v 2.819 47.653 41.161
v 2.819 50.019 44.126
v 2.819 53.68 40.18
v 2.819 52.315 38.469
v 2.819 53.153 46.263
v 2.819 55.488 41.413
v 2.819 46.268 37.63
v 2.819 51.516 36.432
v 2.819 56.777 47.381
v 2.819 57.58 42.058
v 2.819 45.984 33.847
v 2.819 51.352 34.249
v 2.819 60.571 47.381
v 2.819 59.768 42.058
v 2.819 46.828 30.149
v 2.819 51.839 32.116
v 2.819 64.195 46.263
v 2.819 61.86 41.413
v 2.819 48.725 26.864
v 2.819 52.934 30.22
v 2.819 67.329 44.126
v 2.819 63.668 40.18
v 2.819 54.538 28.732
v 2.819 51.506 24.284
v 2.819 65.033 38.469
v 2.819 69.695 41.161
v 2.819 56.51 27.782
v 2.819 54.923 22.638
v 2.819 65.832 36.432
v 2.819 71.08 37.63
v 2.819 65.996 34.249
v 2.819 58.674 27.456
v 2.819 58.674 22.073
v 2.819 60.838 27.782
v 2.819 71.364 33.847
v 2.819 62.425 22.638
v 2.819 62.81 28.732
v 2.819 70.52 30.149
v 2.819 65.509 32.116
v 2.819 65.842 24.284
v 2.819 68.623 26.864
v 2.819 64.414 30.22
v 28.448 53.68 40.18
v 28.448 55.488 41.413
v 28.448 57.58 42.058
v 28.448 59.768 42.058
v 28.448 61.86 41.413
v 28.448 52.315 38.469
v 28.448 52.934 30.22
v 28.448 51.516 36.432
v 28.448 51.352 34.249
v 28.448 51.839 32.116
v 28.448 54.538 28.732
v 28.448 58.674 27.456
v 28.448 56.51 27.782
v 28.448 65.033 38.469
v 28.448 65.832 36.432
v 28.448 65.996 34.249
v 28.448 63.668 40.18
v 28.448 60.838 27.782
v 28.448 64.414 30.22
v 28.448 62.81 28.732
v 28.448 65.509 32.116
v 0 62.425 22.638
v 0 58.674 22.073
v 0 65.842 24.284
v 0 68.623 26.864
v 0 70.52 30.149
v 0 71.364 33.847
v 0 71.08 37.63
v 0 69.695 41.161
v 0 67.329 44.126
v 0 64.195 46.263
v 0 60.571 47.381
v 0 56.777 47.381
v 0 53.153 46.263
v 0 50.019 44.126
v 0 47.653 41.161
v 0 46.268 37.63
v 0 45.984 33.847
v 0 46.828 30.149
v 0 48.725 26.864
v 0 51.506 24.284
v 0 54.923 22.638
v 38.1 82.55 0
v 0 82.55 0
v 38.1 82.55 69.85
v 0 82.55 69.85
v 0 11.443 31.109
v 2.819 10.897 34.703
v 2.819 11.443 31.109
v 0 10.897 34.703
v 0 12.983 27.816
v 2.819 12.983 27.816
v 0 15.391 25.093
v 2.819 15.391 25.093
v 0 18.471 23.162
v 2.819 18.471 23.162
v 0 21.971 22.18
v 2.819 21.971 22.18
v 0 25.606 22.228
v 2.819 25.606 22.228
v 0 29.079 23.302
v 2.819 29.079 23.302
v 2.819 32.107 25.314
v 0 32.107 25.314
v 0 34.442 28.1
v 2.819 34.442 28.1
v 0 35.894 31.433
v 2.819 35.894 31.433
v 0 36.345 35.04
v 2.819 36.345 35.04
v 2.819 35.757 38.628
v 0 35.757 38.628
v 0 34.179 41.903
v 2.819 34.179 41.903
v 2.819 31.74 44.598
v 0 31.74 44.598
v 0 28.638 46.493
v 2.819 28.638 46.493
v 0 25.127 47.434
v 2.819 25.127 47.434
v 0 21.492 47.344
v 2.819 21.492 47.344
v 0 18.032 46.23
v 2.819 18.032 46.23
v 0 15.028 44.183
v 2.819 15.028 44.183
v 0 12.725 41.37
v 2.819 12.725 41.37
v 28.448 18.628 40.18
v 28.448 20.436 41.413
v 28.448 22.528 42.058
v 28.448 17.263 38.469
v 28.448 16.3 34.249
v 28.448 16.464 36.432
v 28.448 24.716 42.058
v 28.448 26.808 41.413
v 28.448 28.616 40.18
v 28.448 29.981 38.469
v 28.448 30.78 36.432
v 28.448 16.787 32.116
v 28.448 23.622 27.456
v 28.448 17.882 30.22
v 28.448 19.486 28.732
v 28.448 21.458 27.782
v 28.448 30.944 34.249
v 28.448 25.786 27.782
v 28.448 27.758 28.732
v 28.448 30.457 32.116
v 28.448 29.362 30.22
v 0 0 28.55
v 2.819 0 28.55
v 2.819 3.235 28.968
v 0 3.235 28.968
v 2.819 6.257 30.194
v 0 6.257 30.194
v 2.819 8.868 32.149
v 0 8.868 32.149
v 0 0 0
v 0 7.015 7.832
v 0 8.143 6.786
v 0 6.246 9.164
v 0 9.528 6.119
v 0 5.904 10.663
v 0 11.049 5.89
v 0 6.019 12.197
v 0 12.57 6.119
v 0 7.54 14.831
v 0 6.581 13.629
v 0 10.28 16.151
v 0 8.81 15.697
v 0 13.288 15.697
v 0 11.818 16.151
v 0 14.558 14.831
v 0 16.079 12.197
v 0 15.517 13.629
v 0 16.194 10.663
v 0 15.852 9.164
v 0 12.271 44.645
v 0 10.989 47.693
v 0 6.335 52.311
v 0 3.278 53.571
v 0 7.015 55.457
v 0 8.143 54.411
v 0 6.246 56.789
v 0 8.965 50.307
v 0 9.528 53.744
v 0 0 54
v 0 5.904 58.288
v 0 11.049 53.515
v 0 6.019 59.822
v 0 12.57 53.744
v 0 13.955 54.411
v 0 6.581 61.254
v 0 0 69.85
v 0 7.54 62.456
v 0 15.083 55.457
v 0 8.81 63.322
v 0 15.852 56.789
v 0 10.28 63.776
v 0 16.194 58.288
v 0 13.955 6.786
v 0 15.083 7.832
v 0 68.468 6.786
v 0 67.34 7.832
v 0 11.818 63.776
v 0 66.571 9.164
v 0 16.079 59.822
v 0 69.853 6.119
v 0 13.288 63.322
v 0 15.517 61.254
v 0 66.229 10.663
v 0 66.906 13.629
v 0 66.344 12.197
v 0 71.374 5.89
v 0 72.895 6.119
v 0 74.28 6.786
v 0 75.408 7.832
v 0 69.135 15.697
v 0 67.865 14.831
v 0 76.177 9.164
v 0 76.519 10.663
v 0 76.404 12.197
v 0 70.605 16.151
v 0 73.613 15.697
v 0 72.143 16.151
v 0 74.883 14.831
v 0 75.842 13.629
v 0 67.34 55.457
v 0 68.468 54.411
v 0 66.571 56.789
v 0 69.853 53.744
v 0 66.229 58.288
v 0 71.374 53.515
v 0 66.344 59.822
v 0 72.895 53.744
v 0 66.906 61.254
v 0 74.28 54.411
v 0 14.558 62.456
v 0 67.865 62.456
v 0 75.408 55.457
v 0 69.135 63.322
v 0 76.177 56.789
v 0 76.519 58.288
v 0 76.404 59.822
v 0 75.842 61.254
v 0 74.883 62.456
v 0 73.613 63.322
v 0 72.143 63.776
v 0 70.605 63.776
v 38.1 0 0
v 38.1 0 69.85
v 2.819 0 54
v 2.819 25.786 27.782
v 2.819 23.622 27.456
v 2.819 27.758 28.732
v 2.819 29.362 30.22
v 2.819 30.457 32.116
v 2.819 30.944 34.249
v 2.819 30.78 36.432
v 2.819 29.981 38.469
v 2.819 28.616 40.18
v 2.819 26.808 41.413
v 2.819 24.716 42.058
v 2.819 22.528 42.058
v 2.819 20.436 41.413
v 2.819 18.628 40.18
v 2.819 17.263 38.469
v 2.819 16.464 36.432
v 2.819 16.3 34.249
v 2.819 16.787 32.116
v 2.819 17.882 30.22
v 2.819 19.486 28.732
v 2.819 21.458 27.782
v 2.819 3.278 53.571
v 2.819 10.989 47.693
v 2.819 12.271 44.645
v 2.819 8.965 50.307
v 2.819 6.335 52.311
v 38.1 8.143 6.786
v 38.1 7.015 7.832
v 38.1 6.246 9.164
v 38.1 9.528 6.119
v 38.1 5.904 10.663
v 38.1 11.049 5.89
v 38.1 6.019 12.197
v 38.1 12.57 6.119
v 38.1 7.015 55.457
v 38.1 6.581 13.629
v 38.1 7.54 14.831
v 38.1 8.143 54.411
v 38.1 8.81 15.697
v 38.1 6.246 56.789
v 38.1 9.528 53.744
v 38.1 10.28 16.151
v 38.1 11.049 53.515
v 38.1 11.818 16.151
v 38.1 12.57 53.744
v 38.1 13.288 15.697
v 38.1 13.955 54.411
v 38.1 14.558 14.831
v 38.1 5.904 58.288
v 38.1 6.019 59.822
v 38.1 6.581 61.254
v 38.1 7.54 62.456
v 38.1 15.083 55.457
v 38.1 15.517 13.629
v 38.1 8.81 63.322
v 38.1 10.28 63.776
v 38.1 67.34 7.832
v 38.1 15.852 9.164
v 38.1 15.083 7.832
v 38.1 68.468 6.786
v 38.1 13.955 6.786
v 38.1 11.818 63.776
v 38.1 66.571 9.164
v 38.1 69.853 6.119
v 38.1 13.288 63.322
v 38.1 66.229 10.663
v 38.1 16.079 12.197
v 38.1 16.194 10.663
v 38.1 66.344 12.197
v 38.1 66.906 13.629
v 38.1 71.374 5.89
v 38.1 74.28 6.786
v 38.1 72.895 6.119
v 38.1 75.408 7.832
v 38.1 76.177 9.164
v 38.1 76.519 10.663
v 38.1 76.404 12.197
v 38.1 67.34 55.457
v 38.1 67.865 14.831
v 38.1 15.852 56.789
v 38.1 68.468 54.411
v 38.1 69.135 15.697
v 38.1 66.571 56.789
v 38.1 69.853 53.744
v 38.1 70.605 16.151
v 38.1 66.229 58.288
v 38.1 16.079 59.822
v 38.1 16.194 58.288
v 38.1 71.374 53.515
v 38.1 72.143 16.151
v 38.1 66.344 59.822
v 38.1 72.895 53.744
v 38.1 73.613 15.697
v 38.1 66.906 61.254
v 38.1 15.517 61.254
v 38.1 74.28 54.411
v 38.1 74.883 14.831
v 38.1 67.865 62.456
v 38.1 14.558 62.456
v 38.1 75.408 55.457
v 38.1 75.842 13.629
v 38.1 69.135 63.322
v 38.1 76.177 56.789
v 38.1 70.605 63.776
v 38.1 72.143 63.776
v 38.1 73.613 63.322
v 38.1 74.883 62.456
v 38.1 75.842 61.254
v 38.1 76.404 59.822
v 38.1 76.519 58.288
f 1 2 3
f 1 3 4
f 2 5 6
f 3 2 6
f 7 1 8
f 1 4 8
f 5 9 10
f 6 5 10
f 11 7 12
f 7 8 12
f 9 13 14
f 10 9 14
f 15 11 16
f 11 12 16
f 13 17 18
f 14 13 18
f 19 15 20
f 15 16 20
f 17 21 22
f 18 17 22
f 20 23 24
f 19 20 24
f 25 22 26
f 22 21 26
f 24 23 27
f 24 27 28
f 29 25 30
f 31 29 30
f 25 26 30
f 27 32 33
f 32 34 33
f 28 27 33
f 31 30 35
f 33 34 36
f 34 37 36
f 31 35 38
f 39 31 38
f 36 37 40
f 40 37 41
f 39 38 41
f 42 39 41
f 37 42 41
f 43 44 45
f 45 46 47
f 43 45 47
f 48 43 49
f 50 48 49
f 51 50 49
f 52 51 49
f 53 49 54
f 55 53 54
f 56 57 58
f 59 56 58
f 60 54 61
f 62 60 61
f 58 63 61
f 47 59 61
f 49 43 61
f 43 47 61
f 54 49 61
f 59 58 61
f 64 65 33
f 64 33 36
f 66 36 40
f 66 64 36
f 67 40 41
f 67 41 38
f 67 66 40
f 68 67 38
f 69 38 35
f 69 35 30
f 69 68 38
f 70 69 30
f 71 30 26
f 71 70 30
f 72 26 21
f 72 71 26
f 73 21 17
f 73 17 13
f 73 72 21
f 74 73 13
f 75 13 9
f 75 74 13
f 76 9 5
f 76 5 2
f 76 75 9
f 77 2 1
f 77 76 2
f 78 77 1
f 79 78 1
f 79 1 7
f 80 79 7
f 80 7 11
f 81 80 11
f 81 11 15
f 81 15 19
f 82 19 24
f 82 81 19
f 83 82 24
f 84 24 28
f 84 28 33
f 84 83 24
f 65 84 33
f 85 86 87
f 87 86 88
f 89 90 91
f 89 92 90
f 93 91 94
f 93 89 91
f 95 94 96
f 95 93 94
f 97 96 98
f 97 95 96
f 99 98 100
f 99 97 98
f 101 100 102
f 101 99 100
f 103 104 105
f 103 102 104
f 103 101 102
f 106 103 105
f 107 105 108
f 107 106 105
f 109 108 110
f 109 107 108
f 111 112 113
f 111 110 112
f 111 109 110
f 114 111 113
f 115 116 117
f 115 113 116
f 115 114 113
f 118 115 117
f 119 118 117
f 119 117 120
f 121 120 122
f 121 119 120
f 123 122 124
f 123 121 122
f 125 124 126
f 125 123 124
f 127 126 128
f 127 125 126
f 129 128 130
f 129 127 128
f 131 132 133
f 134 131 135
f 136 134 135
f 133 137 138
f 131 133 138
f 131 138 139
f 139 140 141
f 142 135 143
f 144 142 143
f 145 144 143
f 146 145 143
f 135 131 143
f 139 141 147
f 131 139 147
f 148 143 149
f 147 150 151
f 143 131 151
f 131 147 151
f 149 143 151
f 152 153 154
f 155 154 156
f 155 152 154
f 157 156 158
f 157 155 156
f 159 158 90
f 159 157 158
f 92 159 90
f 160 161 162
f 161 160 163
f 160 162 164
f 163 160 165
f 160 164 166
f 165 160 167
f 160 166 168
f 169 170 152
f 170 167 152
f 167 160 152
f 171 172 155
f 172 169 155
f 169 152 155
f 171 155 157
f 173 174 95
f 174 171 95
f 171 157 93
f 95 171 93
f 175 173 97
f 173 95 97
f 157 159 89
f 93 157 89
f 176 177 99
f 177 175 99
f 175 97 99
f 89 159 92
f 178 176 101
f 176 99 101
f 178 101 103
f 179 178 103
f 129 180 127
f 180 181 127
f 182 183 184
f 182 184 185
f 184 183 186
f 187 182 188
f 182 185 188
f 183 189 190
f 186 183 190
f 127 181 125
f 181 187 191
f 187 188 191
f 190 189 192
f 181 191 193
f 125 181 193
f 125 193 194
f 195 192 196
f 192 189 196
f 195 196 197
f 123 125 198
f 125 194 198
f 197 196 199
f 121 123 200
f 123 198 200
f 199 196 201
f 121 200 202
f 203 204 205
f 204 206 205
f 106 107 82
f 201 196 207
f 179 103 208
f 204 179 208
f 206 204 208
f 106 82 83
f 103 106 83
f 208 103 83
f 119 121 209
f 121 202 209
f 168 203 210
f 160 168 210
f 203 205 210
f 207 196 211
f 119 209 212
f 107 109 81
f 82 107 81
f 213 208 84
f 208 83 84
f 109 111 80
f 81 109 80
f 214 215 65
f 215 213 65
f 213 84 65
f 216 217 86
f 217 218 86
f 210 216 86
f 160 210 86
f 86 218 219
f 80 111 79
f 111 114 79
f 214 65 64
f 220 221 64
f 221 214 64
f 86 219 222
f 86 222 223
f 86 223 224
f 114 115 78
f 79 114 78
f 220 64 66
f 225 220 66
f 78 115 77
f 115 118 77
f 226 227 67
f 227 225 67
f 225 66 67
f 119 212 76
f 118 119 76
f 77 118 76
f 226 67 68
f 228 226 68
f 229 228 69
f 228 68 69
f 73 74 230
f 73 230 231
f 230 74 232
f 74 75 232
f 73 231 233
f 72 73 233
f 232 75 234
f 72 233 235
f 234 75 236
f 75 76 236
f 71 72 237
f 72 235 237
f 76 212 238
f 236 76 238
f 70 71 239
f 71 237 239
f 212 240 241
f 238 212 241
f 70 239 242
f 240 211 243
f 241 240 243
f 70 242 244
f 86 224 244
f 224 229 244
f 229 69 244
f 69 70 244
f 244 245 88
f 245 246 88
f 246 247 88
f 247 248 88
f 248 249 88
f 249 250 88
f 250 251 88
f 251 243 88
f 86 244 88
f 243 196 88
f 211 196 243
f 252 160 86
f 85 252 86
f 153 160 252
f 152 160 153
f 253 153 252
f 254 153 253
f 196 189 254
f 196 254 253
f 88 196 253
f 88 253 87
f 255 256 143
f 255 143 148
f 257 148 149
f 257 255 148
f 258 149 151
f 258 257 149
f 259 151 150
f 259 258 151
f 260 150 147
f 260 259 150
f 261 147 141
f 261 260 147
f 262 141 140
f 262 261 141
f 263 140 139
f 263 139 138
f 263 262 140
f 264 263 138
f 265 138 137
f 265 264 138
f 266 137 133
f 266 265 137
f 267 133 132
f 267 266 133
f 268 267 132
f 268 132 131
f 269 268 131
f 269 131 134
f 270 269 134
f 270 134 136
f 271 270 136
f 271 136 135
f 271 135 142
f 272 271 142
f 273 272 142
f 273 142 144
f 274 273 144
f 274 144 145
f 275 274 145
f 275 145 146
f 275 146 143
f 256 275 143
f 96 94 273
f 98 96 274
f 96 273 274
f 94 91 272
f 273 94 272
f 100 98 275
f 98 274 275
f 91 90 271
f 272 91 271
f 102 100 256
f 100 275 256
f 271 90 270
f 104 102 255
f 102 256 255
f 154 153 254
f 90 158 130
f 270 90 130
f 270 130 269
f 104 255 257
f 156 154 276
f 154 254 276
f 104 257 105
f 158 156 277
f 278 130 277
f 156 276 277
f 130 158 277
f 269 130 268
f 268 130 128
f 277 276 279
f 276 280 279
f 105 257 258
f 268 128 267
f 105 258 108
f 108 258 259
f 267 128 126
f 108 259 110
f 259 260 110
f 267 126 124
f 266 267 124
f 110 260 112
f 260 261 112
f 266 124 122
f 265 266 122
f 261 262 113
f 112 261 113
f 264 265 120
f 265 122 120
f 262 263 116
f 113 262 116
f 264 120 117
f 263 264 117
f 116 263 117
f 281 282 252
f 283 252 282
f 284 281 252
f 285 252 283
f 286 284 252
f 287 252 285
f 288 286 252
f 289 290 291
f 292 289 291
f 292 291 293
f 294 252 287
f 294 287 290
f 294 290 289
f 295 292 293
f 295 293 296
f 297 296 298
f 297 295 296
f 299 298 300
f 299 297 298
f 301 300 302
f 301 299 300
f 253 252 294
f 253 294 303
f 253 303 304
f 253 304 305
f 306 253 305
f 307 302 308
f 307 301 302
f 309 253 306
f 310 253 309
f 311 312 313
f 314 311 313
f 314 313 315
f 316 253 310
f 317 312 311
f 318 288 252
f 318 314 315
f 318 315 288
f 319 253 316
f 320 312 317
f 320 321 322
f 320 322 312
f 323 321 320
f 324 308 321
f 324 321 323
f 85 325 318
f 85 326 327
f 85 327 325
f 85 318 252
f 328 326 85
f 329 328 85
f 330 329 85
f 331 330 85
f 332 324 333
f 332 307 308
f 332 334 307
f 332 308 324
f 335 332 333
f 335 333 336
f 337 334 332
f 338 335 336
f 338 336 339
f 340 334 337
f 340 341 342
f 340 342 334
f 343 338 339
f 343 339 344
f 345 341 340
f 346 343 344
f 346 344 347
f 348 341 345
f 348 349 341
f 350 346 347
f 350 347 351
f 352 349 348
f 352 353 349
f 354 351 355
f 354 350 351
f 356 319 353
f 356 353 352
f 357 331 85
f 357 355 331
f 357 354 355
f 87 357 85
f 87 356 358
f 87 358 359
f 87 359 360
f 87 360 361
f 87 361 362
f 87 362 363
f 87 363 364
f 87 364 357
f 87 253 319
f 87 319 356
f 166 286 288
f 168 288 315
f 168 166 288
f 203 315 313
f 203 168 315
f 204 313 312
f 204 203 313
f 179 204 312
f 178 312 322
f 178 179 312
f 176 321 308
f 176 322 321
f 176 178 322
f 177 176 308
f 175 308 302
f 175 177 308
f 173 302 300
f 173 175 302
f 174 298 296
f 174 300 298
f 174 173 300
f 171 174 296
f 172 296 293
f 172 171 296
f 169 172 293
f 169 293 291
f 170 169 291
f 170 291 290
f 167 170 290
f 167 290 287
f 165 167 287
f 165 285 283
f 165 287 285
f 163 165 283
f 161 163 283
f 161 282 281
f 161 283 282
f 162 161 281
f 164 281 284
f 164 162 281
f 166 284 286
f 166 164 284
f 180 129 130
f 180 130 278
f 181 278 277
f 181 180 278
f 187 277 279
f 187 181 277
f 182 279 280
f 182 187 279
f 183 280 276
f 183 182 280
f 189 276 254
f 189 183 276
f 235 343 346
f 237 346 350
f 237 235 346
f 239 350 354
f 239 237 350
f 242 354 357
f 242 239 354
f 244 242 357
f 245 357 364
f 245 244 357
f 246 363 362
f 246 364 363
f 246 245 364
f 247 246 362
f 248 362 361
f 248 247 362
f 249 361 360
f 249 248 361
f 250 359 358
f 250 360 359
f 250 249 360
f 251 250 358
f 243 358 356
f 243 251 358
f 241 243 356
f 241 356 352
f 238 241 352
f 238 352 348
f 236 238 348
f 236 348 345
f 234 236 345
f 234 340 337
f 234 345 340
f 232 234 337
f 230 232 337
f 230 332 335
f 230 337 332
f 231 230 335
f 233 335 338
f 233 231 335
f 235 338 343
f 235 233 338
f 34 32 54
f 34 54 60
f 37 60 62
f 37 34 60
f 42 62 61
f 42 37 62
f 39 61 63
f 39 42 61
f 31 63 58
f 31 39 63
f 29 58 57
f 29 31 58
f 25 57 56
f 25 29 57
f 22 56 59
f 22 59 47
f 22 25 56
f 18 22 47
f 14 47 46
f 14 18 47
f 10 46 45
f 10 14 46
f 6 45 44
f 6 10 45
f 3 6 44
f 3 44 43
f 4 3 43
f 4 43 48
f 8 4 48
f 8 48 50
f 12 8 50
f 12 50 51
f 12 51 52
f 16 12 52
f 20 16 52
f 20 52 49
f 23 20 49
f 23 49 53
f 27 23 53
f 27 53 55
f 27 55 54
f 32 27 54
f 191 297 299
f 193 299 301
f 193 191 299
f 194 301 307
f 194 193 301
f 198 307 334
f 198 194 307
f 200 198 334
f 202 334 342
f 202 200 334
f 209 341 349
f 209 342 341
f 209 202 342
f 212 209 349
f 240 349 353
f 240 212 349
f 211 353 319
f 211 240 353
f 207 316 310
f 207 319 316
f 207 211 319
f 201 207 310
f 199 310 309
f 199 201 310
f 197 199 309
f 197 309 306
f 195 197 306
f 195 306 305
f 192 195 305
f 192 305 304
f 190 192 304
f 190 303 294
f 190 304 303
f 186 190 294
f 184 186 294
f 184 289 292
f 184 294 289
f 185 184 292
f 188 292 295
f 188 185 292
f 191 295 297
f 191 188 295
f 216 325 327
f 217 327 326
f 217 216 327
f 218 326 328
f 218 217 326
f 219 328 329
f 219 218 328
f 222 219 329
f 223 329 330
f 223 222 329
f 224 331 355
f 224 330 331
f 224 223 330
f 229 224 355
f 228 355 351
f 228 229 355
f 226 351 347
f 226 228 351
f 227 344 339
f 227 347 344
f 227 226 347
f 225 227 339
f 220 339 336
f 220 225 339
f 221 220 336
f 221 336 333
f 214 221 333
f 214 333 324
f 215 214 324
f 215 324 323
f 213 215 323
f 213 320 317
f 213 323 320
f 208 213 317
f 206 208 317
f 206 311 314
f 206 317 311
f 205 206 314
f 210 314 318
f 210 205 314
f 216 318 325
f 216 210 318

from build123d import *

# Parameters (mm, degrees)
SKETCH1_W           = 82.55
SKETCH1_H           = 69.85
BOSS_EXTRUDE1_DEPTH = 38.1
SKETCH2_R           = 5.159375
CUT_EXTRUDE2_DEPTH  = 115.652235041
SKETCH3_R           = 7.3421875
CUT_EXTRUDE3_DEPTH  = 28.448
SKETCH4_R           = 12.7254
CUT_EXTRUDE4_DEPTH  = 2.8194
SKETCH6_R           = 12.7254
CUT_EXTRUDE7_DEPTH  = 2.8194


with BuildPart() as part:
    # Sketch1 → Boss-Extrude1 (new body)
    with BuildSketch(Plane.YZ):
        with Locations((41.275, 34.925)):
            Rectangle(SKETCH1_W, SKETCH1_H)
    extrude(amount=BOSS_EXTRUDE1_DEPTH)

    # Sketch2 → Cut-Extrude2 (cut, through all)
    with BuildSketch(Plane.YZ):
        with Locations(Location((11.049, 11.049, 0), (0, 0, 270))):
            Circle(SKETCH2_R)
        with Locations(Location((71.374, 11.049, 0), (0, 0, 270))):
            Circle(SKETCH2_R)
        with Locations(Location((11.049, 58.674, 0), (0, 0, 270))):
            Circle(SKETCH2_R)
        with Locations(Location((71.374, 58.674, 0), (0, 0, 270))):
            Circle(SKETCH2_R)
    extrude(amount=CUT_EXTRUDE2_DEPTH, mode=Mode.SUBTRACT)

    # Sketch3 → Cut-Extrude3 (cut)
    with BuildSketch(Plane.YZ):
        with Locations(Location((23.622, 34.798, 0), (0, 0, 270))):
            Circle(SKETCH3_R)
        with Locations(Location((58.674, 34.798, 0), (0, 0, 270))):
            Circle(SKETCH3_R)
    extrude(amount=CUT_EXTRUDE3_DEPTH, mode=Mode.SUBTRACT)

    # Sketch4 → Cut-Extrude4 (cut)
    with BuildSketch(Plane.YZ):
        with Locations(Location((23.622, 34.798, 0), (0, 0, 270))):
            Circle(SKETCH4_R)
        with Locations(Location((58.674, 34.798, 0), (0, 0, 270))):
            Circle(SKETCH4_R)
    extrude(amount=CUT_EXTRUDE4_DEPTH, mode=Mode.SUBTRACT)

    # Sketch6 → Cut-Extrude7 (cut)
    with BuildSketch(Plane.YZ):
        with Locations((0, 41.275)):
            Circle(SKETCH6_R)
    extrude(amount=CUT_EXTRUDE7_DEPTH, mode=Mode.SUBTRACT)


solid = part.part
